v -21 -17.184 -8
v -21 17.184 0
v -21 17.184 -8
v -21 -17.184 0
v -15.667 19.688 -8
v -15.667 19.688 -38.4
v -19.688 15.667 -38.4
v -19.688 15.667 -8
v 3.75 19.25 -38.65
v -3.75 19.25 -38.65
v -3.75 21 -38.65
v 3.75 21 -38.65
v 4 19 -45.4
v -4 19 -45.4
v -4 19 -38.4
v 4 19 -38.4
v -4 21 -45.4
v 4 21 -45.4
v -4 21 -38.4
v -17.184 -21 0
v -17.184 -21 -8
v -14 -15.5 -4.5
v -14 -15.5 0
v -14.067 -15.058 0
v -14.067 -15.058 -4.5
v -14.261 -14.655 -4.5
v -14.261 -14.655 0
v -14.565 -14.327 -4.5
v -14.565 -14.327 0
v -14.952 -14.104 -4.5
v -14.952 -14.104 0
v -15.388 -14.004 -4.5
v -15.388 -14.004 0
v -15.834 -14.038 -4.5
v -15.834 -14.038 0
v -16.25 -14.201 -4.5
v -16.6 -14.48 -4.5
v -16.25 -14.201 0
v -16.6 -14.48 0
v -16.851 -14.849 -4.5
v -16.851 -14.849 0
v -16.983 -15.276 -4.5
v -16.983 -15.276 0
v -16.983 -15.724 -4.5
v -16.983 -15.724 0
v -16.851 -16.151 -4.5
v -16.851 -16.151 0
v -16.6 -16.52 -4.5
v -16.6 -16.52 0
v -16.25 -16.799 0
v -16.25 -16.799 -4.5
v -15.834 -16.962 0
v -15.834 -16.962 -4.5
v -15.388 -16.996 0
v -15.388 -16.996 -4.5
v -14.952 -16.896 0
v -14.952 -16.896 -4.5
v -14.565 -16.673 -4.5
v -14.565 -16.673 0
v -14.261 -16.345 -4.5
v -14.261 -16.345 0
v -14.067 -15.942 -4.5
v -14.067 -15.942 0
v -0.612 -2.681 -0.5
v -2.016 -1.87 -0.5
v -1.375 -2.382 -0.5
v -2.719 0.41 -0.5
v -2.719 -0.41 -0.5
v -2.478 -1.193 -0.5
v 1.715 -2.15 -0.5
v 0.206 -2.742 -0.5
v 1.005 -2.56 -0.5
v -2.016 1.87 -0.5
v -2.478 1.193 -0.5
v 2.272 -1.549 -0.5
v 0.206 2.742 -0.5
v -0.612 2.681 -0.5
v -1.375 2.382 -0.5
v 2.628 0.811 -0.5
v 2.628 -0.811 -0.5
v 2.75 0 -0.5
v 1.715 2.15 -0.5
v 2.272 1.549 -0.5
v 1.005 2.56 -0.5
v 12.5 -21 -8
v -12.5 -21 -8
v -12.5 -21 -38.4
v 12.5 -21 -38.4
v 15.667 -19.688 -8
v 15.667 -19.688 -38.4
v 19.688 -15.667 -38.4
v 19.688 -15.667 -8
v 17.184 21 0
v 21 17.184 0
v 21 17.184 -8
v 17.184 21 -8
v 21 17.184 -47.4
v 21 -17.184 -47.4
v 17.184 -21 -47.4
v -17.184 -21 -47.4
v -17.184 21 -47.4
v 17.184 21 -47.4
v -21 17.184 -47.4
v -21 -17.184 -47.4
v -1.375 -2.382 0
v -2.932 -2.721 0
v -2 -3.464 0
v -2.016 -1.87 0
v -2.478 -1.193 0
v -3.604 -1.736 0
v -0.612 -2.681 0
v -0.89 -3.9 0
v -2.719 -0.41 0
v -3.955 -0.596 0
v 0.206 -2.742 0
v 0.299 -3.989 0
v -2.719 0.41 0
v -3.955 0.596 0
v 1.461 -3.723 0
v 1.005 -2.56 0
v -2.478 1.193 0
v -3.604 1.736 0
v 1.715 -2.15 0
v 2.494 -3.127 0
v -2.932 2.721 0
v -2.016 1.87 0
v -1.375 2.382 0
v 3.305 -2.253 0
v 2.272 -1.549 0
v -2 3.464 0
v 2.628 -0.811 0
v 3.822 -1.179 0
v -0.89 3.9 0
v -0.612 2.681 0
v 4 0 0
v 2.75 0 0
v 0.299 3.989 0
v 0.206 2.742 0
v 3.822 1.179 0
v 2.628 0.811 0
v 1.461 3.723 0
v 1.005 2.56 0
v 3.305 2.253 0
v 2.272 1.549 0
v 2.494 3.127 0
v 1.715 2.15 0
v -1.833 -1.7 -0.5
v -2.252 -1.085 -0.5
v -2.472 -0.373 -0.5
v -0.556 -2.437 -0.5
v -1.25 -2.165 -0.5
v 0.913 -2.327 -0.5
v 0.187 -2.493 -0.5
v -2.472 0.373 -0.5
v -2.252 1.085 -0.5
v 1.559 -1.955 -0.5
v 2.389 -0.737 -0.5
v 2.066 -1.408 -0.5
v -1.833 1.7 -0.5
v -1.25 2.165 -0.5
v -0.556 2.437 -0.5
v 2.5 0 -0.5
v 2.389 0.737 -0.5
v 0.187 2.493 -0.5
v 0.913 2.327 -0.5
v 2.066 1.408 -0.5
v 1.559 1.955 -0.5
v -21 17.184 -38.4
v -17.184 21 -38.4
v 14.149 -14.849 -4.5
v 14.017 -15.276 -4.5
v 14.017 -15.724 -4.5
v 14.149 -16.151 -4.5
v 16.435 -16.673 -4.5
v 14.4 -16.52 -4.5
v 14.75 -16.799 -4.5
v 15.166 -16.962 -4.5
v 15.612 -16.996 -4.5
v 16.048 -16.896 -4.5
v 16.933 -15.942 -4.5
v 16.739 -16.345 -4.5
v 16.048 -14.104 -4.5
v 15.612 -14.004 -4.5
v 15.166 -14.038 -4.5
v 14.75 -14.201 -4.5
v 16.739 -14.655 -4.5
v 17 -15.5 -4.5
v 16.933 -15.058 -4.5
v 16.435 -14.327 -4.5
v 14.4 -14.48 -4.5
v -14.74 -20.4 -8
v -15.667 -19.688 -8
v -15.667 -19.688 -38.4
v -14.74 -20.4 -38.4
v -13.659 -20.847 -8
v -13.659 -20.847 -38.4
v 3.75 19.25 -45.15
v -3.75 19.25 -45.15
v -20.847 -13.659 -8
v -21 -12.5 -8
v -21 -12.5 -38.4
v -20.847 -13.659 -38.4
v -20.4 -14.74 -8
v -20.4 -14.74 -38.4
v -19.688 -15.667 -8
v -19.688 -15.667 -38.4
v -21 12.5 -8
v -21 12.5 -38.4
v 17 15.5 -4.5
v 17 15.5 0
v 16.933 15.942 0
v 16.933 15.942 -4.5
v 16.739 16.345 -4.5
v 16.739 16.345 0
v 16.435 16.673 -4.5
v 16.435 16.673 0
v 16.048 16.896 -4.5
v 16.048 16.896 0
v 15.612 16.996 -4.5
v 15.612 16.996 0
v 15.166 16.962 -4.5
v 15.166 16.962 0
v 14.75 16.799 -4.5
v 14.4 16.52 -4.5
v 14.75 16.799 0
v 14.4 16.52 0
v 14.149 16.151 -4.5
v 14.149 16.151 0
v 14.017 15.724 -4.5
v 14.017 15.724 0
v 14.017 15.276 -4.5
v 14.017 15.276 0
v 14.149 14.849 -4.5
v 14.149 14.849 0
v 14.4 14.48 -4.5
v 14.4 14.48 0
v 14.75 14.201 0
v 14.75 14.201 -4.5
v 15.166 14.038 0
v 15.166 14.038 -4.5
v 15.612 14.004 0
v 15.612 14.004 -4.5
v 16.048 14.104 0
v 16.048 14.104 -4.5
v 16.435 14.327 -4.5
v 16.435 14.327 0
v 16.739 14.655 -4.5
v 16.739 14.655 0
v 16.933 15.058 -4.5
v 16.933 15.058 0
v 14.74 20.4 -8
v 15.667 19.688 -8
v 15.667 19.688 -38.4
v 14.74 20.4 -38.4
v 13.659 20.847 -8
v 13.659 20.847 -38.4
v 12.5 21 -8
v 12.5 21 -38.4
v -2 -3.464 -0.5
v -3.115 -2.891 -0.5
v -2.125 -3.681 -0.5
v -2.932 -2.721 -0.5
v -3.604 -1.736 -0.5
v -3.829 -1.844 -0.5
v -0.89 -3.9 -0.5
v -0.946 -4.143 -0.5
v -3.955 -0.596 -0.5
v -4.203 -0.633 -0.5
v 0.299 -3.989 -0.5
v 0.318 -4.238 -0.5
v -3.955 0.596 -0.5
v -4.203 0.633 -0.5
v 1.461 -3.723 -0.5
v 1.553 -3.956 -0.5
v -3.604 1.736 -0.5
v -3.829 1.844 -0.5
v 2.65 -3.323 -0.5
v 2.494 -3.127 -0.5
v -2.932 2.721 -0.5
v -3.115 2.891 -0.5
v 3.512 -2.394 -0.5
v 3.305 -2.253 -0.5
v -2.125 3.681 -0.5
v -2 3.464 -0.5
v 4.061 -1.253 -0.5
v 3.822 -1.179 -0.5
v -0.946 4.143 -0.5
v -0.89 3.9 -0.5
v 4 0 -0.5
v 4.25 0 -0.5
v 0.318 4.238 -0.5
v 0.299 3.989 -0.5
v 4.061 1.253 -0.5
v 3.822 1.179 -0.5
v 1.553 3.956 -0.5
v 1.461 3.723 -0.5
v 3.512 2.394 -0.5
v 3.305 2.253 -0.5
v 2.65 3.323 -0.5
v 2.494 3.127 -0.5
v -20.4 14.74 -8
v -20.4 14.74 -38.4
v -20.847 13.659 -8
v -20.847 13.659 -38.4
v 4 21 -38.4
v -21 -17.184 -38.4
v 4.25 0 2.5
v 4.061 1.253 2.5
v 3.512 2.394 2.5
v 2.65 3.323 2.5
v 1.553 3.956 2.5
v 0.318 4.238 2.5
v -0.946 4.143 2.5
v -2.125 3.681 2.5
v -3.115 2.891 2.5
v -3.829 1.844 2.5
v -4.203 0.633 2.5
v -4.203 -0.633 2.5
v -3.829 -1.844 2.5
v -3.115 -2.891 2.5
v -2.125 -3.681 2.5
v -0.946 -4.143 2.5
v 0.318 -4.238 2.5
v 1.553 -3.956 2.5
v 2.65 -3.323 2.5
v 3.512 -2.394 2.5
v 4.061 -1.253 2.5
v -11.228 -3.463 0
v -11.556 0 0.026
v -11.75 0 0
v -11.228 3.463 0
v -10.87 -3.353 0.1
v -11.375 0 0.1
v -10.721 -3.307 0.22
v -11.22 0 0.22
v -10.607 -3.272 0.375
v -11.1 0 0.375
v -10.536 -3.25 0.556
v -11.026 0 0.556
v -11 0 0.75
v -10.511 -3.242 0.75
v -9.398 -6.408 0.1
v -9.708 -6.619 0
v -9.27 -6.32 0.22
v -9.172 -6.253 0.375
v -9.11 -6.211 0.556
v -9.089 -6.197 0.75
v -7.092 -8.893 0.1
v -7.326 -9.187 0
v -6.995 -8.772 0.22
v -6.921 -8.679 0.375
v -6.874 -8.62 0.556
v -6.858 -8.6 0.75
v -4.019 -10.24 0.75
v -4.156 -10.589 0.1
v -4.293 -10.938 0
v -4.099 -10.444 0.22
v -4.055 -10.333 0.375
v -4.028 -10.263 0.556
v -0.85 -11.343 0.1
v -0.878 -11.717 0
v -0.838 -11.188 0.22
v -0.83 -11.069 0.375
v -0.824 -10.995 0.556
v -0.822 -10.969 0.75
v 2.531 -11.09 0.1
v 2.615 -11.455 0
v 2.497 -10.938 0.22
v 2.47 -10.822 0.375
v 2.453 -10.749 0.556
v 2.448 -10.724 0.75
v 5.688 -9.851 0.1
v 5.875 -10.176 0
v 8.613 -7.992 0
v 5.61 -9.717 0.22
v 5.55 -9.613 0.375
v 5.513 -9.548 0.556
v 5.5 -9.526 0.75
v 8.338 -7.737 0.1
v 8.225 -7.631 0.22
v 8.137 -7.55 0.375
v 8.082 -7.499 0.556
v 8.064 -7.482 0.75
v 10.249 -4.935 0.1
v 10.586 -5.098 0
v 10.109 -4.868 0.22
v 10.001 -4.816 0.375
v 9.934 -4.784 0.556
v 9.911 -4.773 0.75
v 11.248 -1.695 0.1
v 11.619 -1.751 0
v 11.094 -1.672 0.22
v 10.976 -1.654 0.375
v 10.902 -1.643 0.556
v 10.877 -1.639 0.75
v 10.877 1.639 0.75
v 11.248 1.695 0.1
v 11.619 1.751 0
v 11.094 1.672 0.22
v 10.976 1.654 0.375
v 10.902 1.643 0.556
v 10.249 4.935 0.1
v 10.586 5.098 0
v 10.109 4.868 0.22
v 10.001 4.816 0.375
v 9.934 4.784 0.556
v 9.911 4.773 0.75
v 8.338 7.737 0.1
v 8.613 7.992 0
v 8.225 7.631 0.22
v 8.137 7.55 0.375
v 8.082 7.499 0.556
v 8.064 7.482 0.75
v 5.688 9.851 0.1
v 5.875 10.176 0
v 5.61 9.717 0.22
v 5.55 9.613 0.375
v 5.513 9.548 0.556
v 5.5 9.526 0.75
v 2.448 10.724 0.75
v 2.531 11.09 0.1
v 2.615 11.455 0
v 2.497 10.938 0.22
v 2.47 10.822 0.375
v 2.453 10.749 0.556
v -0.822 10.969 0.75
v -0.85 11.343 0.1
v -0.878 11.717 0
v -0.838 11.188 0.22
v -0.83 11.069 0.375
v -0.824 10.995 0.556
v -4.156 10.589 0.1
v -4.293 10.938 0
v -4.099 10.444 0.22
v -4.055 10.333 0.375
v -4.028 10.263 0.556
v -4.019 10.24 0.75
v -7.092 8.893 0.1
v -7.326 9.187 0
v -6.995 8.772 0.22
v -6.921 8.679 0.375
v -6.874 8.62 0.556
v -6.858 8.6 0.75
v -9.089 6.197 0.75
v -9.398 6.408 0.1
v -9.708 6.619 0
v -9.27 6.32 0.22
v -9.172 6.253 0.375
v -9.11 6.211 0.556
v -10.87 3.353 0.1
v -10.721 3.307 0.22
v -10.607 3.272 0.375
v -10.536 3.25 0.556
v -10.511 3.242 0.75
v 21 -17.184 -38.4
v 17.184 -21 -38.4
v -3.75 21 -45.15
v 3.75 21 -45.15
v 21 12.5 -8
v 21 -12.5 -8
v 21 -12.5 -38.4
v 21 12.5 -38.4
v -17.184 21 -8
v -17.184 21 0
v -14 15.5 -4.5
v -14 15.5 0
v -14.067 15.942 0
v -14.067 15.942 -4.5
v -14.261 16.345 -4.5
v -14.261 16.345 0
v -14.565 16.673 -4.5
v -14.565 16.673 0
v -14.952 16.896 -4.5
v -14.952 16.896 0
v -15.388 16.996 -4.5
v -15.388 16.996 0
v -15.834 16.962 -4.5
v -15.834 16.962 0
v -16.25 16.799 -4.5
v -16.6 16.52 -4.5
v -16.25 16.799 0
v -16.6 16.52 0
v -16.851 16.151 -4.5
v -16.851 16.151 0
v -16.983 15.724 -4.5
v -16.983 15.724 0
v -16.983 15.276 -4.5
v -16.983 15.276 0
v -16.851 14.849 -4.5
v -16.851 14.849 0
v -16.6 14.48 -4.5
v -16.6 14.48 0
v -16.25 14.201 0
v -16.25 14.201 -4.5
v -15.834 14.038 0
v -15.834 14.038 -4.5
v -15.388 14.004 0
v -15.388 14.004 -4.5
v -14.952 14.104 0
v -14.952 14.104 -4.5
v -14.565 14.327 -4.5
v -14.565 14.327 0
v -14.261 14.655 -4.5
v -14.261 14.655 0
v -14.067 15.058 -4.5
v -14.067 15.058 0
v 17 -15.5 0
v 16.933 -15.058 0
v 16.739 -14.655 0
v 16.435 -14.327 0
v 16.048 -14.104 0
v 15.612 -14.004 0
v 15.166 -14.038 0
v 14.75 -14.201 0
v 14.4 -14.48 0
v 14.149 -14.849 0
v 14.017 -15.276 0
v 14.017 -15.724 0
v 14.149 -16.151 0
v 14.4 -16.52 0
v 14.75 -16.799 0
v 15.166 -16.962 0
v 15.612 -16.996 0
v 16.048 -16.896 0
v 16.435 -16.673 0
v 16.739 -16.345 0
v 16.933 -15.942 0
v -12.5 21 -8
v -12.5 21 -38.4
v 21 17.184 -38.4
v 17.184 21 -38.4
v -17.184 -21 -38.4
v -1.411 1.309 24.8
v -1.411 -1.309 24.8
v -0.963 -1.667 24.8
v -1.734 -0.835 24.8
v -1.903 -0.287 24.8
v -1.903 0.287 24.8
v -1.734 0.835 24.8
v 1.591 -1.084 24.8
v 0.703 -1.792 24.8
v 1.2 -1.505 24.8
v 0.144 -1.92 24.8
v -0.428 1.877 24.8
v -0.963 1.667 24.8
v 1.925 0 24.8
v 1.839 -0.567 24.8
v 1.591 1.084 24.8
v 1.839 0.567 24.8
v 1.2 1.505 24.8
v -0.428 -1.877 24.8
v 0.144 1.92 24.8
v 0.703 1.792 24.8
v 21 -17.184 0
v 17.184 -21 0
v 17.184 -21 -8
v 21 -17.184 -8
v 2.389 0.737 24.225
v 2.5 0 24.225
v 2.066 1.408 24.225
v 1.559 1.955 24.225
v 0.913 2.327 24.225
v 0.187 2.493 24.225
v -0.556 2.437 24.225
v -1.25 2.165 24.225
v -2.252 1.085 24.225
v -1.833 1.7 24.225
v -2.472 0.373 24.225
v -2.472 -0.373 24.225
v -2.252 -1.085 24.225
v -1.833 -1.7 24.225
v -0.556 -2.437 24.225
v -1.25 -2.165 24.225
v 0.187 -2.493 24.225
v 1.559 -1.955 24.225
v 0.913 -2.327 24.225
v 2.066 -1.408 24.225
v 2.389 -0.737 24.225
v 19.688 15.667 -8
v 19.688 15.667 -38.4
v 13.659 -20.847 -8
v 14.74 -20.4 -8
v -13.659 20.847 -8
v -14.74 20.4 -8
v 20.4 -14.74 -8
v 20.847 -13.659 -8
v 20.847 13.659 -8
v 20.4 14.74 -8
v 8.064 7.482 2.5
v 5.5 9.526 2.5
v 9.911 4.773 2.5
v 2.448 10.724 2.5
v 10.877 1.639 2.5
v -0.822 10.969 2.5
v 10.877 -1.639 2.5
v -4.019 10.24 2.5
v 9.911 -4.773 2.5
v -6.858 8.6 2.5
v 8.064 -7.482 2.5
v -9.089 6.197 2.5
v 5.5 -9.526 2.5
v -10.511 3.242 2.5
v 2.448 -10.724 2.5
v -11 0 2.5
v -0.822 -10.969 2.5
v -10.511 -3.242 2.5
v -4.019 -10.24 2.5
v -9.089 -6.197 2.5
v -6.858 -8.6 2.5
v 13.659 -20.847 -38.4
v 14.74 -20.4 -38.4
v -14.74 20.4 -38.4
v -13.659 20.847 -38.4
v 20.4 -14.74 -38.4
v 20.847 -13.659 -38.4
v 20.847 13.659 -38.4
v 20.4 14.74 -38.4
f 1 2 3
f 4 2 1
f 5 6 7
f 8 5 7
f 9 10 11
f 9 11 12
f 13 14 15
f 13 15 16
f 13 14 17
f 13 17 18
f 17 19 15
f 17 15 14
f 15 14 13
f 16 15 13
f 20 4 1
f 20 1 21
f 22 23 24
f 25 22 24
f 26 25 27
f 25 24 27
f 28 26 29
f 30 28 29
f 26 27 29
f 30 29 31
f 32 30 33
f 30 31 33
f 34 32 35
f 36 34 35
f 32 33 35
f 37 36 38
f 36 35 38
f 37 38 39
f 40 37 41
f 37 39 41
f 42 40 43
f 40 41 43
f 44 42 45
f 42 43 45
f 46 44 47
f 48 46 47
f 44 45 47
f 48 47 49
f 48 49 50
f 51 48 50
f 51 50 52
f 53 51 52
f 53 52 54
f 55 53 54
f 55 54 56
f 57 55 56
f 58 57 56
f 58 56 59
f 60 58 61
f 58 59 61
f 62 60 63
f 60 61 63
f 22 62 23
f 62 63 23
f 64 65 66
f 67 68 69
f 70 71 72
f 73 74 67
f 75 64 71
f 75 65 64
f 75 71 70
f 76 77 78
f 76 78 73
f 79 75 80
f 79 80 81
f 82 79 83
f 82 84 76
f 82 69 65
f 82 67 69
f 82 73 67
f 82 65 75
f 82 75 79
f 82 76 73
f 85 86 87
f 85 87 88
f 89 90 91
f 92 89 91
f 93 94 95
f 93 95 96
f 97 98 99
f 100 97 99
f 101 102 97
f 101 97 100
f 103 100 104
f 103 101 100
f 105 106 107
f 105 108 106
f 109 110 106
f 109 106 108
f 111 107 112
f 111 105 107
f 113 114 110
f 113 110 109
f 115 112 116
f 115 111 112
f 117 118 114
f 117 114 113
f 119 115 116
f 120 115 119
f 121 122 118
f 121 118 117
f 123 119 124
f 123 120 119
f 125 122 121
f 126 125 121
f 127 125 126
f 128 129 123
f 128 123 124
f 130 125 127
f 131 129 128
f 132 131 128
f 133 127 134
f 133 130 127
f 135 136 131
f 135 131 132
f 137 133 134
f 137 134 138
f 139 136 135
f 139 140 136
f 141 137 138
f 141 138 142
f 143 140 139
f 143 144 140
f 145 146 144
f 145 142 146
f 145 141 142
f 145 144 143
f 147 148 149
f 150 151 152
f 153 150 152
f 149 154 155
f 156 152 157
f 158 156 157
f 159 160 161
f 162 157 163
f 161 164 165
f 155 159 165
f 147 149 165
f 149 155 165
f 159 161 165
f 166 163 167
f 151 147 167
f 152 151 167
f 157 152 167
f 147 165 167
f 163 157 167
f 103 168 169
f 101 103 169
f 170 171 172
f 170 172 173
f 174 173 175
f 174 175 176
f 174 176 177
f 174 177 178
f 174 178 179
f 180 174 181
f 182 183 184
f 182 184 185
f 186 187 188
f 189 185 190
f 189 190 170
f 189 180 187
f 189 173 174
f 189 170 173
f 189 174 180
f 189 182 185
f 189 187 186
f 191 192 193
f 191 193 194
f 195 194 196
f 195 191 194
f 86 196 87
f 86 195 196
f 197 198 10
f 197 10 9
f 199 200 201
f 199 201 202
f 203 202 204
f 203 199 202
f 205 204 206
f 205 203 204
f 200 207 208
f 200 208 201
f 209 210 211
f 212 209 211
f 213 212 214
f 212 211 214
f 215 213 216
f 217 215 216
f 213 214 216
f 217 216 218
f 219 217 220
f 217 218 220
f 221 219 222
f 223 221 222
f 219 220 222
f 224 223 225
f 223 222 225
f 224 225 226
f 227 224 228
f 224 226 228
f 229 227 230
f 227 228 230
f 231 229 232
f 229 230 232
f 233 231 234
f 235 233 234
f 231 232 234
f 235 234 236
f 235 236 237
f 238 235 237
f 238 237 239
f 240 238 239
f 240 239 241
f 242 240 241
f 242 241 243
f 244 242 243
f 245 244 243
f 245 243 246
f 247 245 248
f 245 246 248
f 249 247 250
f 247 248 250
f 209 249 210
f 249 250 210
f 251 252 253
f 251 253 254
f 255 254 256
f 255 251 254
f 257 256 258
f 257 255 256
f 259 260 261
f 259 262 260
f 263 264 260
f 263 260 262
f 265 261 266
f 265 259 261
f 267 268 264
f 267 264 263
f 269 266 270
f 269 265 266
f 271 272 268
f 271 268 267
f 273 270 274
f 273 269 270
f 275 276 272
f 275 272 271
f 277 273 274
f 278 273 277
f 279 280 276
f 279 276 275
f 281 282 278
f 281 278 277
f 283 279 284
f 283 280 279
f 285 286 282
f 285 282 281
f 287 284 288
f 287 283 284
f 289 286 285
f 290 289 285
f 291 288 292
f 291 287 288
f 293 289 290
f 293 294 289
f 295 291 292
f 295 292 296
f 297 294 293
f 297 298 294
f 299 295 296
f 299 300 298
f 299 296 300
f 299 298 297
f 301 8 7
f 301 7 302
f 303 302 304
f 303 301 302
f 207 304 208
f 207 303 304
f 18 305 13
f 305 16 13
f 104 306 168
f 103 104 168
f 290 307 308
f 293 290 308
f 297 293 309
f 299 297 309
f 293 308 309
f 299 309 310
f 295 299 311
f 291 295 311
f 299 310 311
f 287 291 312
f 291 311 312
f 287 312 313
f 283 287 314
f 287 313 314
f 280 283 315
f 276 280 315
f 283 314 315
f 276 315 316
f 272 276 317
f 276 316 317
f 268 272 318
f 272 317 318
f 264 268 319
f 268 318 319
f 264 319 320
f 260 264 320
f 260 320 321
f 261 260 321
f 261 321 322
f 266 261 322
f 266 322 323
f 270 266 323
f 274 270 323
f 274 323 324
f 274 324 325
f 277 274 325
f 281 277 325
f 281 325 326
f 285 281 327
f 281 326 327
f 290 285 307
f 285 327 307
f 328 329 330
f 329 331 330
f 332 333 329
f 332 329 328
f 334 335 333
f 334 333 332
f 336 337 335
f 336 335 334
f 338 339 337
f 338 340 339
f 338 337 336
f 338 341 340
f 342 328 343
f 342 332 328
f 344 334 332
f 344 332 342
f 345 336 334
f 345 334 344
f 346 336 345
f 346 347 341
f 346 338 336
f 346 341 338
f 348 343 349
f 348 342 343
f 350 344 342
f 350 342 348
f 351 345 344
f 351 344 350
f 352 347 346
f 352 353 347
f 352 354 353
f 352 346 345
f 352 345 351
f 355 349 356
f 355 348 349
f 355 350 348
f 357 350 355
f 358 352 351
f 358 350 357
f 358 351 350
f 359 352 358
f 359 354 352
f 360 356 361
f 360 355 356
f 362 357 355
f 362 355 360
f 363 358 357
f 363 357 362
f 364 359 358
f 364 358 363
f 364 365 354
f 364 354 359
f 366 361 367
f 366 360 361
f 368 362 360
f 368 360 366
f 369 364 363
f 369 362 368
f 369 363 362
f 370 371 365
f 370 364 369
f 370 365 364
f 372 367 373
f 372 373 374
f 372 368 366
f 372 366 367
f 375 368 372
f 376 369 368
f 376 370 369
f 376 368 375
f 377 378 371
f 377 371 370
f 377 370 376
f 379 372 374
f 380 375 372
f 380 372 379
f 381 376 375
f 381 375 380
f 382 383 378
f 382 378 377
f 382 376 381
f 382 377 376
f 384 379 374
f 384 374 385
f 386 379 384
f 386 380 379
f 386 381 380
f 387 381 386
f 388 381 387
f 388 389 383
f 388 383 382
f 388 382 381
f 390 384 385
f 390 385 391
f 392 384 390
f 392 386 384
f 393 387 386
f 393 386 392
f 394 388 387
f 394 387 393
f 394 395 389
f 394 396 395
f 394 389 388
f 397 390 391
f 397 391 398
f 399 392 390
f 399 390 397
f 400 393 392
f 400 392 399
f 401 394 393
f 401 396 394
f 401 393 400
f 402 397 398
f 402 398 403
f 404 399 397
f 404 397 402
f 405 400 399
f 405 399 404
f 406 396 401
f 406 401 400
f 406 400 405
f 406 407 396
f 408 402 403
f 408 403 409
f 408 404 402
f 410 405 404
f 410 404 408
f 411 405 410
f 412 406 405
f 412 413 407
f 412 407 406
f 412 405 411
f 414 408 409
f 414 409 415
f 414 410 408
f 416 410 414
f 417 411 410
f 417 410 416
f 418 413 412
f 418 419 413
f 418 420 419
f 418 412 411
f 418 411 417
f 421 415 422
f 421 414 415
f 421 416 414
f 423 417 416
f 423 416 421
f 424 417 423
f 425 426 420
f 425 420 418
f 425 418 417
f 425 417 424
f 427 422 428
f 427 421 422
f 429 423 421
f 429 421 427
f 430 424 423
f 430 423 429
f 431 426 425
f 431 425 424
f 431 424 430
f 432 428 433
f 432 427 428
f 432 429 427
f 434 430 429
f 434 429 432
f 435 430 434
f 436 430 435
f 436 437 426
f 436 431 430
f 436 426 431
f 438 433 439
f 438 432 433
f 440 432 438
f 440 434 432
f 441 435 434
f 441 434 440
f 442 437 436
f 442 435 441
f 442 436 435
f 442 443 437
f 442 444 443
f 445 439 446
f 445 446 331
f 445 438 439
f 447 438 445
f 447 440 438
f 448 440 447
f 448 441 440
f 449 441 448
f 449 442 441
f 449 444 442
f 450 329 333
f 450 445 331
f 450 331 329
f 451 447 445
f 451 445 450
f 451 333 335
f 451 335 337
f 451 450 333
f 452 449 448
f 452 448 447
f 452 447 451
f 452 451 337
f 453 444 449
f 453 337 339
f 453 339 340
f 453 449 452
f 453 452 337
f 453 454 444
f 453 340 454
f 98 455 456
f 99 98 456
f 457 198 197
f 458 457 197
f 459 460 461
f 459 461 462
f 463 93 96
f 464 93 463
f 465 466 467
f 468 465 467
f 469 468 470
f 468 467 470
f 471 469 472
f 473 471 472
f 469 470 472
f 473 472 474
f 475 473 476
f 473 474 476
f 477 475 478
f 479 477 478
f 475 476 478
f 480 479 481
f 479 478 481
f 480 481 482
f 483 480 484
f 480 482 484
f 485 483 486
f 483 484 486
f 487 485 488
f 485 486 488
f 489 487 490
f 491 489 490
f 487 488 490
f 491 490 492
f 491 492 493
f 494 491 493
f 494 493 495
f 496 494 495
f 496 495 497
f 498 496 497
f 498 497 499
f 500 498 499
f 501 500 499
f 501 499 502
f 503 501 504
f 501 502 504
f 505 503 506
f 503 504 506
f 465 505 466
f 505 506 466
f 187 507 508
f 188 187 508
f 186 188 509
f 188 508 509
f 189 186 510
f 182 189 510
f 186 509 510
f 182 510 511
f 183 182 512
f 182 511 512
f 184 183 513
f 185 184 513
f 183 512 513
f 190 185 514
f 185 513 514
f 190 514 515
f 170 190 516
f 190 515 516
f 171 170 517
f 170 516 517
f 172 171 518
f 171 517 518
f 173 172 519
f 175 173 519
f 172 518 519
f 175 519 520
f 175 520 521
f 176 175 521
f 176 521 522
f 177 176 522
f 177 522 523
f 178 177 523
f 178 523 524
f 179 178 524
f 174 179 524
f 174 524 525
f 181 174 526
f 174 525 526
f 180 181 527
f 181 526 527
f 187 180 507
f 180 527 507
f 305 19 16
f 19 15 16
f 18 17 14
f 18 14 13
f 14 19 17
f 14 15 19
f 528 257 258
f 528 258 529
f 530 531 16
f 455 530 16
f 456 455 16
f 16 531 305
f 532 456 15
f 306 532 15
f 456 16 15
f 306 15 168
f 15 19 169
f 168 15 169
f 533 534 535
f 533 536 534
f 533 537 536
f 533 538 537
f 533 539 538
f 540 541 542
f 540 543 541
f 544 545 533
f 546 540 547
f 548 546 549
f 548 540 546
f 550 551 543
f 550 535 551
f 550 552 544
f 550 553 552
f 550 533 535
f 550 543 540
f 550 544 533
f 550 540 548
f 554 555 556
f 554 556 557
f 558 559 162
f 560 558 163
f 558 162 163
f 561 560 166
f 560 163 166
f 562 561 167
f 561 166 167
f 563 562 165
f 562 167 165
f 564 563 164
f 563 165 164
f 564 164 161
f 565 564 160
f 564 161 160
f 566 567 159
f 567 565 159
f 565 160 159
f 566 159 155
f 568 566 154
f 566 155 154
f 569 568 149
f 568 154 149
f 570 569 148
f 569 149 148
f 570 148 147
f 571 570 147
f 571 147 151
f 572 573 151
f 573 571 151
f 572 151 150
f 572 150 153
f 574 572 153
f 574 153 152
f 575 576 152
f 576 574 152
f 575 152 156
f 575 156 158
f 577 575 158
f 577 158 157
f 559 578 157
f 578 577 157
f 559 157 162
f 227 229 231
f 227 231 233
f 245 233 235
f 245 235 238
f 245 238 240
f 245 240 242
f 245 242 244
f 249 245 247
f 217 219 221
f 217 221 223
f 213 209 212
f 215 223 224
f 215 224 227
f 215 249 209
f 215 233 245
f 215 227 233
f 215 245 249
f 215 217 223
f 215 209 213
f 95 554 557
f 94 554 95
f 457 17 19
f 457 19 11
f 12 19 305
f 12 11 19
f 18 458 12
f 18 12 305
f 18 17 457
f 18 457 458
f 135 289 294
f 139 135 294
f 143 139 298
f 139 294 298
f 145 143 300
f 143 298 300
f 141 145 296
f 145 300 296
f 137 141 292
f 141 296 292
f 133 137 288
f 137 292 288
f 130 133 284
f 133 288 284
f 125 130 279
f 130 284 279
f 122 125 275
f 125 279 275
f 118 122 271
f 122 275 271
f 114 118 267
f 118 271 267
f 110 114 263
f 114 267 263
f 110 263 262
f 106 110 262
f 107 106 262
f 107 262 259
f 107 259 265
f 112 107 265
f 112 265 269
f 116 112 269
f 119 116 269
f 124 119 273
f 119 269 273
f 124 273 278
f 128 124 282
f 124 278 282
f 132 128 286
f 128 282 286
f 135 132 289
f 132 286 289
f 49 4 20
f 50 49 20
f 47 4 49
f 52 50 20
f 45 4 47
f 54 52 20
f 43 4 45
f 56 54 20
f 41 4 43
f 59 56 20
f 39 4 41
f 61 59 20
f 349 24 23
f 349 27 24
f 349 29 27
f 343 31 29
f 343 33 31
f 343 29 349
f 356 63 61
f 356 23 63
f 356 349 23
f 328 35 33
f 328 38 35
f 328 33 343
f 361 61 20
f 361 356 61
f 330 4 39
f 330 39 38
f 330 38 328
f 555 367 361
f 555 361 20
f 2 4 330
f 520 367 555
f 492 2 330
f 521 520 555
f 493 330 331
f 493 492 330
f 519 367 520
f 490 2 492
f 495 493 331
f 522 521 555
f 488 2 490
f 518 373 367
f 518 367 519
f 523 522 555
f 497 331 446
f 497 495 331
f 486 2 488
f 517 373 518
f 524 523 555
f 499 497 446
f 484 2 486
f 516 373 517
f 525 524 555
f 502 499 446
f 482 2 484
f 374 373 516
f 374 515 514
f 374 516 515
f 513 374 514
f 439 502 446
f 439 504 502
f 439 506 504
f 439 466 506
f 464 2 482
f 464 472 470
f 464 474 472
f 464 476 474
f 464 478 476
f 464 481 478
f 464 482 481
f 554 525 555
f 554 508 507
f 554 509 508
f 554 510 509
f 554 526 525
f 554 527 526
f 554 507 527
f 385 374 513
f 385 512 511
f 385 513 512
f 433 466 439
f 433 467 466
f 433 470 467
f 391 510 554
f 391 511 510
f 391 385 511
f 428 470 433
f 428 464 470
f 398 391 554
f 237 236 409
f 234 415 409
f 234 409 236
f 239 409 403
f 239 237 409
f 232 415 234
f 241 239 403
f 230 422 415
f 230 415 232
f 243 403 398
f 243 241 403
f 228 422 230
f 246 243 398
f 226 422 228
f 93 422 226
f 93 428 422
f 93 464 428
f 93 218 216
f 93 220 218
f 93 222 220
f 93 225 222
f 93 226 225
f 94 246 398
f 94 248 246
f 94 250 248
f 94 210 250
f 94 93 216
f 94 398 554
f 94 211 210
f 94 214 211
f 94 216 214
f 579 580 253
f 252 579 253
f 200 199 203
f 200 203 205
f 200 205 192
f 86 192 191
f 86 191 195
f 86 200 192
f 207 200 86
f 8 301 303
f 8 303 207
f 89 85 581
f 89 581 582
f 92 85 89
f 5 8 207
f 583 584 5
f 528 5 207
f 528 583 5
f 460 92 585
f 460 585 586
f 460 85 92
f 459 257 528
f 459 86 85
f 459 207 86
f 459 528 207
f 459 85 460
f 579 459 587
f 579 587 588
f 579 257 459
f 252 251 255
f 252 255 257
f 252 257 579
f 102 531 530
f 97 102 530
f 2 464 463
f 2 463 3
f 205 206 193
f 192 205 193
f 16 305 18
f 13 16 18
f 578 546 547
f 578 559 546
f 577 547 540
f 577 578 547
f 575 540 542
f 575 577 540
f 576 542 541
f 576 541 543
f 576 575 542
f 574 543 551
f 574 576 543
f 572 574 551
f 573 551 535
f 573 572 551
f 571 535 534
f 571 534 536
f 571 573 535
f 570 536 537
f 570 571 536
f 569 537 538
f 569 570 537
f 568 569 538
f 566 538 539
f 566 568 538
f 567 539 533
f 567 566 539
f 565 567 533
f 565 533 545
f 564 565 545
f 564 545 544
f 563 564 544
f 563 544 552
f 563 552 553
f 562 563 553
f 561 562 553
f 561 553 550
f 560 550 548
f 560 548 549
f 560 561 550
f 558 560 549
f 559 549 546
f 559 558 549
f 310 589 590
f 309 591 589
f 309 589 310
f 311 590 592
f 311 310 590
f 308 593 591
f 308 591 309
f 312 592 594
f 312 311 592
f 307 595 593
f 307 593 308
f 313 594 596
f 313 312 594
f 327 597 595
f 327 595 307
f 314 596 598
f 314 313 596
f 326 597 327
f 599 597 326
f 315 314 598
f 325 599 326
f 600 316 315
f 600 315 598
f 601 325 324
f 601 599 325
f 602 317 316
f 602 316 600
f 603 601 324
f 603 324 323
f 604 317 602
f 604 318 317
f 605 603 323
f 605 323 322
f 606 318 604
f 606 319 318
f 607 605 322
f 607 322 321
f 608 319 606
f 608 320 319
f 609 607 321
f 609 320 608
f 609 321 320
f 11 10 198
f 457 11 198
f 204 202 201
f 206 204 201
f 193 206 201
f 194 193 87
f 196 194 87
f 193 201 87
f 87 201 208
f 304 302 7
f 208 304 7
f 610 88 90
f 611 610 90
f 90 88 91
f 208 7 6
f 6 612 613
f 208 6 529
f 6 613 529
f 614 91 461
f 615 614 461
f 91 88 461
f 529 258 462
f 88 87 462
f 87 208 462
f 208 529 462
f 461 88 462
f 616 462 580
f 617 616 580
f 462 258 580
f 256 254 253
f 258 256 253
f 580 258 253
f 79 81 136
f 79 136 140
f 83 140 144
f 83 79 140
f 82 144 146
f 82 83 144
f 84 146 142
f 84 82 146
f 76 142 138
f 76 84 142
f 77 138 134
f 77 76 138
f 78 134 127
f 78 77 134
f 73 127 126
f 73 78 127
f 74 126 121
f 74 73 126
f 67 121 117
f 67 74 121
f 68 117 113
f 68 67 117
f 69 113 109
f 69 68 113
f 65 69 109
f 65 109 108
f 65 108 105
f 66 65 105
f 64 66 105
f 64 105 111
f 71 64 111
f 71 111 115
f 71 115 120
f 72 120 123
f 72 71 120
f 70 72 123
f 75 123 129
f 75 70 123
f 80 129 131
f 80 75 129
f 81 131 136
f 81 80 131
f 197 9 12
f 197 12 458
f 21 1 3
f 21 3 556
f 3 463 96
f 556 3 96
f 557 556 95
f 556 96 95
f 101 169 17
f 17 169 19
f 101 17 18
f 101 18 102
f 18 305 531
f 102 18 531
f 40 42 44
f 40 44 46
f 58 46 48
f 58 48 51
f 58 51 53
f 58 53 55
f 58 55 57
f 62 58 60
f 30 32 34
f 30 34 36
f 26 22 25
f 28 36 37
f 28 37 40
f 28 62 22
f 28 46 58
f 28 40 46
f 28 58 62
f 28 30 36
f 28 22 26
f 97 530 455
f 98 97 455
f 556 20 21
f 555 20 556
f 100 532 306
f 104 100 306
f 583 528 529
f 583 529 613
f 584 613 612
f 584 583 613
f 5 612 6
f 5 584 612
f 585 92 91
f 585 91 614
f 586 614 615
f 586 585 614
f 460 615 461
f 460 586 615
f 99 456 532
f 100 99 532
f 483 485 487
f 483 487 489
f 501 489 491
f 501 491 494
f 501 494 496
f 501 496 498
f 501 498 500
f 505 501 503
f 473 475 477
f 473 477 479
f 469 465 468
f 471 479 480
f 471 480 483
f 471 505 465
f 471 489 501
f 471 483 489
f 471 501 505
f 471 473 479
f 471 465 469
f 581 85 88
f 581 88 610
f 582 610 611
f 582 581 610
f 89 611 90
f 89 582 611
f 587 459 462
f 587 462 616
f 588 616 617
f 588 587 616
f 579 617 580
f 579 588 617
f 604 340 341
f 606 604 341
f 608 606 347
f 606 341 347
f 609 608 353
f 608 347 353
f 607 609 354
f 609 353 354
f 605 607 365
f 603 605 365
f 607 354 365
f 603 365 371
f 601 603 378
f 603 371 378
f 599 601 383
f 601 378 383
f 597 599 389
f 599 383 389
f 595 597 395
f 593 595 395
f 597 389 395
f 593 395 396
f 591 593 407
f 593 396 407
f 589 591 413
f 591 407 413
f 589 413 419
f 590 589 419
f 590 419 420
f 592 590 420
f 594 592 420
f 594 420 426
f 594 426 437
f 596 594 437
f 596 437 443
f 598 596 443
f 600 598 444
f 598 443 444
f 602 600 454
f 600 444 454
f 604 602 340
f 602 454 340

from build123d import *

# Parameters (mm, degrees)
BOSS_EXTRUDE1_DEPTH = 8
BOSS_EXTRUDE2_DEPTH = 30.4
BOSS_EXTRUDE3_DEPTH = 9
SKETCH5_R           = 1.5
CUT_EXTRUDE1_DEPTH  = 4.5
SKETCH6_R           = 11
BOSS_EXTRUDE4_DEPTH = 2.5
SKETCH9_R           = 4.25
CUT_EXTRUDE2_DEPTH  = 3
SKETCH8_R           = 2.5
BOSS_EXTRUDE5_DEPTH = 25.3
SKETCH11_R          = 4
SKETCH11_R_2        = 2.75
BOSS_EXTRUDE6_DEPTH = 0.5
FILLET1_R           = 0.75
SKETCH13_W          = 8
SKETCH13_H          = 7
CUT_EXTRUDE3_DEPTH  = 2
SKETCH14_W          = 8
SKETCH14_H          = 7
BOSS_EXTRUDE7_DEPTH = 0.25
SKETCH15_W          = 8
SKETCH15_H          = 7
SKETCH15_W_2        = 7.5
SKETCH15_H_2        = 6.5
BOSS_EXTRUDE8_DEPTH = 1.75


with BuildPart() as part:
    # Sketch1 → Boss-Extrude1 (new body)
    with BuildSketch(Plane.XY):
        Polygon((17.183766184, 21), (-17.183766184, 21), (-21, 17.183766184), (-21, -17.183766184), (-17.183766184, -21), (17.183766184, -21), (21, -17.183766184), (21, 17.183766184), align=None)
    extrude(amount=-BOSS_EXTRUDE1_DEPTH)

    # Sketch5 → Cut-Extrude1 (cut)
    with BuildSketch(Plane.XY):
        with Locations((-15.5, 15.5)):
            Circle(SKETCH5_R)
        with Locations((15.5, 15.5)):
            Circle(SKETCH5_R)
        with Locations((15.5, -15.5)):
            Circle(SKETCH5_R)
        with Locations((-15.5, -15.5)):
            Circle(SKETCH5_R)
    extrude(amount=-CUT_EXTRUDE1_DEPTH, mode=Mode.SUBTRACT)

    # Sketch6 → Boss-Extrude4 (add)
    with BuildSketch(Plane.XY):
        with Locations(Location((0, 0, 0), (0, 0, 180))):
            Circle(SKETCH6_R)
    extrude(amount=BOSS_EXTRUDE4_DEPTH)

    # Sketch9 → Cut-Extrude2 (cut)
    with BuildSketch(Plane.XY.offset(2.5)):
        Circle(SKETCH9_R)
    extrude(amount=-CUT_EXTRUDE2_DEPTH, mode=Mode.SUBTRACT)

    # Sketch11 → Boss-Extrude6 (add)
    with BuildSketch(Plane.XY.offset(-0.5)):
        Circle(SKETCH11_R)
        Circle(SKETCH11_R_2, mode=Mode.SUBTRACT)
    extrude(amount=BOSS_EXTRUDE6_DEPTH)

    # Fillet1
    fillet1_edges = [part.edges().sort_by_distance(p)[0] for p in [
        (11, 0, 0),
    ]]
    fillet(fillet1_edges, radius=FILLET1_R)


with BuildPart() as body_2:
    # Sketch3 → Boss-Extrude2 (new body)
    with BuildSketch(Plane(origin=(0, 0, -8), x_dir=(-1, 0, 0), z_dir=(0, 0, -1))):
        with BuildLine():
            Line((-19.68807717, 15.66726189), (-15.66726189, 19.68807717))
            ThreePointArc((-15.66726189, 19.68807717), (-14.214109783, 20.659042365), (-12.5, 21))
            Line((-12.5, 21), (12.5, 21))
            ThreePointArc((12.5, 21), (14.214109783, 20.659042365), (15.66726189, 19.68807717))
            Line((15.66726189, 19.68807717), (19.68807717, 15.66726189))
            ThreePointArc((19.68807717, 15.66726189), (20.659042365, 14.214109783), (21, 12.5))
            Line((21, 12.5), (21, -12.5))
            ThreePointArc((21, -12.5), (20.659042365, -14.214109783), (19.68807717, -15.66726189))
            Line((19.68807717, -15.66726189), (15.66726189, -19.68807717))
            ThreePointArc((15.66726189, -19.68807717), (14.214109783, -20.659042365), (12.5, -21))
            Line((12.5, -21), (-12.5, -21))
            ThreePointArc((-12.5, -21), (-14.214109783, -20.659042365), (-15.66726189, -19.68807717))
            Line((-15.66726189, -19.68807717), (-19.68807717, -15.66726189))
            ThreePointArc((-19.68807717, -15.66726189), (-20.659042365, -14.214109783), (-21, -12.5))
            Line((-21, -12.5), (-21, 12.5))
            ThreePointArc((-21, 12.5), (-20.659042365, 14.214109783), (-19.68807717, 15.66726189))
        make_face()
    extrude(amount=BOSS_EXTRUDE2_DEPTH)


with BuildPart() as body_3:
    # Sketch4 → Boss-Extrude3 (new body)
    with BuildSketch(Plane(origin=(0, 0, -38.4), x_dir=(-1, 0, 0), z_dir=(0, 0, -1))):
        Polygon((-17.183766184, 21), (-21, 17.183766184), (-21, -17.183766184), (-17.183766184, -21), (17.183766184, -21), (21, -17.183766184), (21, 17.183766184), (17.183766184, 21), align=None)
    extrude(amount=BOSS_EXTRUDE3_DEPTH)

    # Sketch13 → Cut-Extrude3 (cut)
    with BuildSketch(Plane(origin=(0, 21, 0), x_dir=(1, 0, 0), z_dir=(0, 1, 0))):
        with Locations((0, 41.9)):
            Rectangle(SKETCH13_W, SKETCH13_H)
    extrude(amount=-CUT_EXTRUDE3_DEPTH, mode=Mode.SUBTRACT)


with BuildPart() as body_4:
    # Sketch8 → Boss-Extrude5 (new body)
    with BuildSketch(Plane.XY.offset(-0.5)):
        Circle(SKETCH8_R)
    extrude(amount=BOSS_EXTRUDE5_DEPTH)

    # Sketch12 → Cut-Revolve1 (revolve, cut)
    with BuildSketch(Plane(origin=(0, 0, 0), x_dir=(0, 0, -1), z_dir=(1, 0, 0)), mode=Mode.PRIVATE) as cut_revolve1_sk:
        Polygon((-24.8, 1.925), (-24.225, 2.5), (-24.8, 2.5), align=None)
    revolve(cut_revolve1_sk.sketch.rotate(Axis((0, 0, 24.8), (0, 0, -1)), 90), axis=Axis((0, 0, 24.8), (0, 0, -1)), mode=Mode.SUBTRACT)


with BuildPart() as body_5:
    # Sketch14 → Boss-Extrude7 (new body)
    with BuildSketch(Plane(origin=(0, 19, 0), x_dir=(1, 0, 0), z_dir=(0, 1, 0))):
        with Locations((0, 41.9)):
            Rectangle(SKETCH14_W, SKETCH14_H)
    extrude(amount=BOSS_EXTRUDE7_DEPTH)

    # Sketch15 → Boss-Extrude8 (add)
    with BuildSketch(Plane(origin=(0, 19.25, 0), x_dir=(1, 0, 0), z_dir=(0, 1, 0))):
        with Locations((0, 41.9)):
            Rectangle(SKETCH15_W, SKETCH15_H)
        with Locations((0, 41.9)):
            Rectangle(SKETCH15_W_2, SKETCH15_H_2, mode=Mode.SUBTRACT)
    extrude(amount=BOSS_EXTRUDE8_DEPTH)


solid = Compound([part.part, body_2.part, body_3.part, body_4.part, body_5.part])
